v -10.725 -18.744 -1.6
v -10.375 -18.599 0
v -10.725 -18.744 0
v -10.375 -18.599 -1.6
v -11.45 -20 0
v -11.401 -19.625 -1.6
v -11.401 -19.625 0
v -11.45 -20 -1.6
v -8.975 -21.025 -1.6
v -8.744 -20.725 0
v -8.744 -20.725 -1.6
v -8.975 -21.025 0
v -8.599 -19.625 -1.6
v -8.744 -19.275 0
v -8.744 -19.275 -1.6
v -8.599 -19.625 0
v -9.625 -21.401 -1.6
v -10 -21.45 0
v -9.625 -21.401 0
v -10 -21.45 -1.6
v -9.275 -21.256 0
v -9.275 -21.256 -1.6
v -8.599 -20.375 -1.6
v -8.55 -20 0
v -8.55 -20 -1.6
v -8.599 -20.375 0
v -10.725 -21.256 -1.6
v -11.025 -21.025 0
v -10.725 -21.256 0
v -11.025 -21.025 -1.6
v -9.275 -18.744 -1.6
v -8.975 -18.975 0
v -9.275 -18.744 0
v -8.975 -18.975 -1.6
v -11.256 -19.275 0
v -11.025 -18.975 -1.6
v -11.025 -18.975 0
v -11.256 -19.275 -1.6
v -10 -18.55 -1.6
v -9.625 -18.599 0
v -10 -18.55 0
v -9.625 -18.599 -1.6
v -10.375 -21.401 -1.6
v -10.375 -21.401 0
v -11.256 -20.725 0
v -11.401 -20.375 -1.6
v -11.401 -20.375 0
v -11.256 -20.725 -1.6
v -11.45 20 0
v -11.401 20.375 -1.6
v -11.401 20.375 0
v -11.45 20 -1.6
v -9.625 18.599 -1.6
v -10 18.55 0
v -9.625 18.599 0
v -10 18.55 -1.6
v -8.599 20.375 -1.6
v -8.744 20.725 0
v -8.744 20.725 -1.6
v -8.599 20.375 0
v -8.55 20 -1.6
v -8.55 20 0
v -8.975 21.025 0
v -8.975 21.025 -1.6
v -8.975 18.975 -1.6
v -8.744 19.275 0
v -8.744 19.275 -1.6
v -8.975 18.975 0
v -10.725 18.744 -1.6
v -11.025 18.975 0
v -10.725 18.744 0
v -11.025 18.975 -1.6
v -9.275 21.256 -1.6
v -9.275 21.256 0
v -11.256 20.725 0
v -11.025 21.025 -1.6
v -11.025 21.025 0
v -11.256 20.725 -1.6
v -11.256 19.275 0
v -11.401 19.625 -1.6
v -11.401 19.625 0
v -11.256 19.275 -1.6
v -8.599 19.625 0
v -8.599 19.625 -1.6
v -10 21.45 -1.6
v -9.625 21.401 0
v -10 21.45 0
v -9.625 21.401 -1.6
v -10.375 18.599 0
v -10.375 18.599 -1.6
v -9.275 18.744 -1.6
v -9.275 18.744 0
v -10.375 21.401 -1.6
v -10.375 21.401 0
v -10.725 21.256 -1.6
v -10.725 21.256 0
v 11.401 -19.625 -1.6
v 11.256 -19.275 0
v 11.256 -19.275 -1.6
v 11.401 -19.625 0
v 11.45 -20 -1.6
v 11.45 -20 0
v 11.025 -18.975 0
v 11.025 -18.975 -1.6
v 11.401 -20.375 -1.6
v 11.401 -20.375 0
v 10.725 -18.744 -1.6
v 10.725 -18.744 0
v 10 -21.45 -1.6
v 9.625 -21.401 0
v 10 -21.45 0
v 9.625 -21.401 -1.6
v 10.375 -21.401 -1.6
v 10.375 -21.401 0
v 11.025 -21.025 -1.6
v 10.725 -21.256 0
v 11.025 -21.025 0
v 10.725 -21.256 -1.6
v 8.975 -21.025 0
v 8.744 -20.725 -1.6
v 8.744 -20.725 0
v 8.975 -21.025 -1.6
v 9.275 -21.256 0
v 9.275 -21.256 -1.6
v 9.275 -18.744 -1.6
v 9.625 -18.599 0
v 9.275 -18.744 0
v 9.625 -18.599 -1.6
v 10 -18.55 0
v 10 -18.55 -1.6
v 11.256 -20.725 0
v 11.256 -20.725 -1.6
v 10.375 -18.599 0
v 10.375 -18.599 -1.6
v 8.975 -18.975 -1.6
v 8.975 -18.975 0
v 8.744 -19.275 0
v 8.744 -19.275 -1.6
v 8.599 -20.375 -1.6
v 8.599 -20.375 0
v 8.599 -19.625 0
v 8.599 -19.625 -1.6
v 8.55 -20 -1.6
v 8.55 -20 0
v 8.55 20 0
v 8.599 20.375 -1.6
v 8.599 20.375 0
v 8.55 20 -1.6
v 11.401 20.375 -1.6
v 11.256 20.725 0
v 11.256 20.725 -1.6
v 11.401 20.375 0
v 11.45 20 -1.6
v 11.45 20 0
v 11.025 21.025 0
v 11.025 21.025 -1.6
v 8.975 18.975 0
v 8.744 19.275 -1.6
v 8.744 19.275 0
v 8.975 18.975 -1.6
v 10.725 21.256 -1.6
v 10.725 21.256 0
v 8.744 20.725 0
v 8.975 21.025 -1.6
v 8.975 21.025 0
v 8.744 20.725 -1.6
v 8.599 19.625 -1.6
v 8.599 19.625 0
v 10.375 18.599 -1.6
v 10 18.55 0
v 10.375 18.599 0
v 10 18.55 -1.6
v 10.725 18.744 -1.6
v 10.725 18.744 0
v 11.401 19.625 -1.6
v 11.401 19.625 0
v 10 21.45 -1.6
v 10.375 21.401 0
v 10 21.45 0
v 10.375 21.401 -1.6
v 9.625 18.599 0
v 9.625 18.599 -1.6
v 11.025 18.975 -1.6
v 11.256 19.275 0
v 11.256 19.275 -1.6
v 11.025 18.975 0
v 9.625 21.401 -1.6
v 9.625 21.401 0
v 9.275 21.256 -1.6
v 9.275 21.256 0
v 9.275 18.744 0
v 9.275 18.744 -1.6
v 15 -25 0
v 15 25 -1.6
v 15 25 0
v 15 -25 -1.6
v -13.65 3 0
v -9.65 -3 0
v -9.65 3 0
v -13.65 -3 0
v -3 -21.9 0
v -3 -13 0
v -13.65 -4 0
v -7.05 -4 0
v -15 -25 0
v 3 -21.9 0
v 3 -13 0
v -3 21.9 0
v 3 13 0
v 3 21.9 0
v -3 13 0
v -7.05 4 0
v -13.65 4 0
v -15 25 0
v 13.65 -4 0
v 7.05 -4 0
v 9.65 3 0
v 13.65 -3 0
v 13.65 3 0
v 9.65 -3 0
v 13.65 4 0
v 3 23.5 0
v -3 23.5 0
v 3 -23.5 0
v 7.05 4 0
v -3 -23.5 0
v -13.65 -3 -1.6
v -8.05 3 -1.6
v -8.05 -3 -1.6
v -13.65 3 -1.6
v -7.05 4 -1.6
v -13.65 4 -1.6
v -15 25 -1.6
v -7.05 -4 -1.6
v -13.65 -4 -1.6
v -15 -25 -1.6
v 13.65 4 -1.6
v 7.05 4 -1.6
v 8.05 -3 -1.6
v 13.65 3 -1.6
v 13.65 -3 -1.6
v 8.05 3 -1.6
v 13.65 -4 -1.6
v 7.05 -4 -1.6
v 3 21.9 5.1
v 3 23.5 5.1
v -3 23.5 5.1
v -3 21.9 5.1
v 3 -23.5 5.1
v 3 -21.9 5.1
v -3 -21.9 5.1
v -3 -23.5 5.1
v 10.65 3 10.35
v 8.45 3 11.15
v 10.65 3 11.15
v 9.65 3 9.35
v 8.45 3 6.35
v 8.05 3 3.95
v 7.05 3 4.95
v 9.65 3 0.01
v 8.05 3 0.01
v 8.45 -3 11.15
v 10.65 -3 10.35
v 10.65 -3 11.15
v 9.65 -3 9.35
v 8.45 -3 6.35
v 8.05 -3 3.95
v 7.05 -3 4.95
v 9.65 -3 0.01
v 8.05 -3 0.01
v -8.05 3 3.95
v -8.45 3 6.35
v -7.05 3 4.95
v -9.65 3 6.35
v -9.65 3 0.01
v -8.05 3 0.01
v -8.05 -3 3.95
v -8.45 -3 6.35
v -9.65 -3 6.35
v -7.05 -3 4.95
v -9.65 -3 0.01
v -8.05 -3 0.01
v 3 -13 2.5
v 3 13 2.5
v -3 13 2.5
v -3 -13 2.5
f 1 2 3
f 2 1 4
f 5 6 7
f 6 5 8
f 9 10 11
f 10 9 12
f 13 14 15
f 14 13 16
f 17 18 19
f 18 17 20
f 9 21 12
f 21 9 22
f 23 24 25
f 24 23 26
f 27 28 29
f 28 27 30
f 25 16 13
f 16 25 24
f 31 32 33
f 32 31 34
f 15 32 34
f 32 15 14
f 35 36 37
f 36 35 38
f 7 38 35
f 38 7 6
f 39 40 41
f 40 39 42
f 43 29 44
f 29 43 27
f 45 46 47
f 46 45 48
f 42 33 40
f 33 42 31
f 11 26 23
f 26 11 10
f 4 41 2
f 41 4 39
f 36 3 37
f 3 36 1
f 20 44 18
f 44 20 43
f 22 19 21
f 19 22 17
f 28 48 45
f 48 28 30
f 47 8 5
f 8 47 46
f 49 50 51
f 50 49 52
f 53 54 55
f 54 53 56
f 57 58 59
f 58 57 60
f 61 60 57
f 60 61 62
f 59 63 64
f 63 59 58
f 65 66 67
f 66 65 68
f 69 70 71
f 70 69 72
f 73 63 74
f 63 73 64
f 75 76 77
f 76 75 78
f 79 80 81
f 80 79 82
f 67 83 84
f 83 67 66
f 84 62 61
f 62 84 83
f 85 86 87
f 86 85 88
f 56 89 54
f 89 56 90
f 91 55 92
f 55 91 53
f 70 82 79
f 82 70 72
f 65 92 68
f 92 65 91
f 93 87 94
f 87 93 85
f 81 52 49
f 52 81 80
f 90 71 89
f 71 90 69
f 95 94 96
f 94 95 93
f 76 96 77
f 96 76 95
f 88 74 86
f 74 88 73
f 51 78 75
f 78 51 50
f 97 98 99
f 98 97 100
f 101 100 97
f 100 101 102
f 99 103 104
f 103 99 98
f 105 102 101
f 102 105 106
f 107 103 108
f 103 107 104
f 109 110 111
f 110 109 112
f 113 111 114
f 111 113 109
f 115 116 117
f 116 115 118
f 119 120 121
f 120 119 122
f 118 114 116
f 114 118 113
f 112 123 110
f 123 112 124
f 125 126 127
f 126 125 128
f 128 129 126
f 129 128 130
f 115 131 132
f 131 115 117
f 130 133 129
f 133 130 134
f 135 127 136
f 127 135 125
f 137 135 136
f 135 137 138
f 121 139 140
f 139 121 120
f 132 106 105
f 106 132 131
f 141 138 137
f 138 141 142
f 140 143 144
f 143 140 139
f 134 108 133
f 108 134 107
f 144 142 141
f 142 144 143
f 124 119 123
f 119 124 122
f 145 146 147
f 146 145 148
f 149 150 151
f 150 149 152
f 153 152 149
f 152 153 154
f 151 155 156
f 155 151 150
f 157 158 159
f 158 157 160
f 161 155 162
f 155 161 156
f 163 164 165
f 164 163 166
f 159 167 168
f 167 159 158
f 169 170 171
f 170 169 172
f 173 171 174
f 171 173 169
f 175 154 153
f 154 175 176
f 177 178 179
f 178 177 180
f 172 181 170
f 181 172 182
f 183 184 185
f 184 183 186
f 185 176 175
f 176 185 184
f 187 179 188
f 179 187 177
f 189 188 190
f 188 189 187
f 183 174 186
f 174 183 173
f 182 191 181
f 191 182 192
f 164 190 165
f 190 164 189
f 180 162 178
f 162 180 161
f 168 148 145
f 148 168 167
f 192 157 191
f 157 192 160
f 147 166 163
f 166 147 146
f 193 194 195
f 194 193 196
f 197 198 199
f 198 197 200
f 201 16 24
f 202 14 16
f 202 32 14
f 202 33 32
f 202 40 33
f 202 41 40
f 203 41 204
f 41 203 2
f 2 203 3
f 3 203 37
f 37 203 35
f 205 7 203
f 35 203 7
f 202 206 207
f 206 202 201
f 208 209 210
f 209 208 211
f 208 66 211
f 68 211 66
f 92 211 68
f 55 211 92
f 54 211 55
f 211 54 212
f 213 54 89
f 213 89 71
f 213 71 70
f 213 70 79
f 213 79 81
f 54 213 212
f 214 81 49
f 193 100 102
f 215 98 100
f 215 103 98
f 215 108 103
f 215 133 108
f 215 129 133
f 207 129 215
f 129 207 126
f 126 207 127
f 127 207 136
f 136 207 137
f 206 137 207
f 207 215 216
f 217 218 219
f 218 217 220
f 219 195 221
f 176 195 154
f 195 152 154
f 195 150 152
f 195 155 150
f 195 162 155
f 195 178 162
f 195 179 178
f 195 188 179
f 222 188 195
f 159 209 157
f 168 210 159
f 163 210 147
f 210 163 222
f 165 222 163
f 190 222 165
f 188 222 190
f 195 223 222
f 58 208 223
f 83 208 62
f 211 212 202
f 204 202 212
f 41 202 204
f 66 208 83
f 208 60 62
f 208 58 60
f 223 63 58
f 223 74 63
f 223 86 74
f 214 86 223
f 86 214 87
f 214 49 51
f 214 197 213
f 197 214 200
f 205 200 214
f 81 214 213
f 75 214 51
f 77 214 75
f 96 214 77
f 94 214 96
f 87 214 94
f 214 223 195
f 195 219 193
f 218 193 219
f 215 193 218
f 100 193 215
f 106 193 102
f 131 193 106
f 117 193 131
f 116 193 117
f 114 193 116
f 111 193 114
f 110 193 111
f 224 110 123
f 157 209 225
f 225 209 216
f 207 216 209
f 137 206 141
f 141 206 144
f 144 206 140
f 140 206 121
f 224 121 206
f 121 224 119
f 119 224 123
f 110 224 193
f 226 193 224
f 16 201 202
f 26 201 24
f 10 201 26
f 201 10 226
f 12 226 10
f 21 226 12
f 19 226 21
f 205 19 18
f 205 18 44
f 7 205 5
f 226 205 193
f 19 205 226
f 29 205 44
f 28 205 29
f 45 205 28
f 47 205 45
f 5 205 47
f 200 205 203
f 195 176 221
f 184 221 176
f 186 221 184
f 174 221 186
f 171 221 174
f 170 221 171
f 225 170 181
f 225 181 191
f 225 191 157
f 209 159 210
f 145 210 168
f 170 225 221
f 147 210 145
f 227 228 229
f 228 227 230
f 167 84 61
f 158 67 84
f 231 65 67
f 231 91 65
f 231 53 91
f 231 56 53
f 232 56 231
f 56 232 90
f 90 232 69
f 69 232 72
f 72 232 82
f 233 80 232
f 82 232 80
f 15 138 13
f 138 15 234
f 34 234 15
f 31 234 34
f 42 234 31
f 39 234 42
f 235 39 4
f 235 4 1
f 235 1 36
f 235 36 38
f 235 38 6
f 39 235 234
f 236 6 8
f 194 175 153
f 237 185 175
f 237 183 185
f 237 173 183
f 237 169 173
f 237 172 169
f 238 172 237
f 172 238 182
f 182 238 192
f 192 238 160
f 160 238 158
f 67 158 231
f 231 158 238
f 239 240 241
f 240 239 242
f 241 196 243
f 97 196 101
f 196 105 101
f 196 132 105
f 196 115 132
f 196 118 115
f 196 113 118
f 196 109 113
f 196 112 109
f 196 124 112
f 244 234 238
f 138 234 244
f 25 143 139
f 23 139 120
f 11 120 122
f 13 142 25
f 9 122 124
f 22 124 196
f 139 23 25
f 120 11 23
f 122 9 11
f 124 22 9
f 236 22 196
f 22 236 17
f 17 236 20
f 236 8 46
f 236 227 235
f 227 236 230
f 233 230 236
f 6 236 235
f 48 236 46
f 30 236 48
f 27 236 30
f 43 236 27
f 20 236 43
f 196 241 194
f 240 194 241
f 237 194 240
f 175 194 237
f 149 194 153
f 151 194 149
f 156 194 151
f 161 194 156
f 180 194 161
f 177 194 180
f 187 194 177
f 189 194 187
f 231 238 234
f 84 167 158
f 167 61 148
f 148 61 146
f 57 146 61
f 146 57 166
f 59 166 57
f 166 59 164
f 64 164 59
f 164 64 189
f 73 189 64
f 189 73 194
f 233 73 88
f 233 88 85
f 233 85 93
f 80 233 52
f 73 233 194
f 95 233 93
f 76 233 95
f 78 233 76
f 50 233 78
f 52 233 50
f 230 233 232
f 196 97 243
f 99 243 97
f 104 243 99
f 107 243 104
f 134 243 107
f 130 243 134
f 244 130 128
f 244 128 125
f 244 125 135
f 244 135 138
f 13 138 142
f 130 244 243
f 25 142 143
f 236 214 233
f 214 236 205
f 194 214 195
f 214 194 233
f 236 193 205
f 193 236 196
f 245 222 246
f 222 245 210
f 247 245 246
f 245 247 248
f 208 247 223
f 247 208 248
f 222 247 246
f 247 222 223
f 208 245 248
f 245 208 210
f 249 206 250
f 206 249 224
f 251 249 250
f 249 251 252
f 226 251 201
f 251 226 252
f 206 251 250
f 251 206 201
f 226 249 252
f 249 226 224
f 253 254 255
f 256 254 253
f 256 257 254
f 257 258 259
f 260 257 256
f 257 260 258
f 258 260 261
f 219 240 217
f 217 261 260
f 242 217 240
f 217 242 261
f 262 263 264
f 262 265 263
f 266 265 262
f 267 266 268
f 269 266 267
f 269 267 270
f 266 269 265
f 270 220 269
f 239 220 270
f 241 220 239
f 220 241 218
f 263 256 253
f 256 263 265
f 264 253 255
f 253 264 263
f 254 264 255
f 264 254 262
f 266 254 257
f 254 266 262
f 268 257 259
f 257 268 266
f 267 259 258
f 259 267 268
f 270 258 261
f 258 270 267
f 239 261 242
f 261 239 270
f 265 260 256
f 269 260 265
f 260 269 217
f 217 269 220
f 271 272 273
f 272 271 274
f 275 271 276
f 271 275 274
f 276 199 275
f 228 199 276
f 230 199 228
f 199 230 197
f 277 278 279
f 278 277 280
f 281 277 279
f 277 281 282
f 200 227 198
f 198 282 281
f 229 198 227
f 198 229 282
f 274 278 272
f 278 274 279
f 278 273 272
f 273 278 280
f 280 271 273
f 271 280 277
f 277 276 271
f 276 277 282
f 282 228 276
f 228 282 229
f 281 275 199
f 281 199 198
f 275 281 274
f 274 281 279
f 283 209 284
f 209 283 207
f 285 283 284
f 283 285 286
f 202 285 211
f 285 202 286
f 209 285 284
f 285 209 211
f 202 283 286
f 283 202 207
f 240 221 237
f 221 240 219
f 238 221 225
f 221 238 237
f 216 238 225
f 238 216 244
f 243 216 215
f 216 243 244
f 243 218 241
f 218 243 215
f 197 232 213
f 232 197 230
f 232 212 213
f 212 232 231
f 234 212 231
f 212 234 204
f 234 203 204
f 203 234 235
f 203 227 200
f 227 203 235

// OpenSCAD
// file: ../../screw-post/screw-post.scad
//-----------------------------------------------------------------------
// Screw post: a round post off the floor that a board screws down onto
//
// Two ways to fix:
//   "nut"  clearance hole through the post and floor; the nut sits in a hex
//          trap in the floor's underside, so the screw goes in from the top
//   "tap"  a pilot hole the screw cuts its own thread in (one or two fittings
//          in PLA/PETG); blind, the floor stays whole underneath
// and "head" for a screw up from below (head in a counterbore, nut on top).
//
// Modules, all in the same frame:
//   screwPostGhost()     the screw (and nut), for previews
//   screwPost()          the post: add to the floor
//   screwPostFloorCut()  subtract from the floor: nut trap / counterbore and hole
//
// Frame: origin on the floor top, on the post's axis. Z up; the floor is
// Z = -floorThick .. 0. Units: mm.
//
// Sizes: "M2", "M2.5", "M3". screwPostScrew(size, ...) says which screw length
// reaches, so a project can assert it has that screw in the kit.
//-----------------------------------------------------------------------

//-- [name, screw Ø, nut across flats, nut thick, head Ø, head height, tap hole, post Ø]
//-- Nuts ISO 4032; heads ISO 7380 button. Tap holes: the usual ~0.8 x Ø for plastic
screwSizes = [
  ["M2",   2.0, 4.0, 1.6, 3.5, 1.1, 1.6, 5.0],
  ["M2.5", 2.5, 5.0, 2.0, 4.4, 1.4, 2.1, 6.0],    // head 4.4: measured on the kit's M2.5 (controller base)
  ["M3",   3.0, 5.5, 2.4, 5.7, 1.65, 2.5, 7.0],
];

screwHoleClear = 0.4;     // added to the screw Ø for a clearance hole
screwNutClear  = 0.3;     // CAL: across flats, nut trap over the nut. Set by the fit piece
screwTapClear  = 0.0;     // CAL: added to the tap hole. Set by the fit piece
screwHeadClear = 0.6;     // counterbore over the head Ø

function screwSize(size) = let (i = search([size], screwSizes)[0])
  assert(i != [] && i != undef, str("unknown screw size ", size)) screwSizes[i];
function screwDia(size)    = screwSize(size)[1];
function screwNutAF(size)  = screwSize(size)[2];
function screwNutH(size)   = screwSize(size)[3];
function screwHeadDia(size)= screwSize(size)[4];
function screwHeadH(size)  = screwSize(size)[5];
function screwPostDia(size)= screwSize(size)[7];

//-- Shortest screw that fills the nut, from the top of the clamped part (h + clamp
//-- above the floor) down to the nut trap's underside. Round up to a length you have.
function screwPostScrew(size, h, floorThick, clamp = 1.6) = h + clamp + floorThick;

module screwPostGhost(size, h, floorThick, clamp = 1.6, length, how = "nut")
{
  d = screwDia(size);
  L = is_undef(length) ? screwPostScrew(size, h, floorThick, clamp) : length;
  top = h + clamp;
  if (how == "head")
  {
    %color("Silver") translate([0, 0, -floorThick]) cylinder(d = screwHeadDia(size), h = screwHeadH(size), $fn = 24);
    %color("Silver") translate([0, 0, -floorThick + screwHeadH(size)]) cylinder(d = d, h = L, $fn = 16);
  }
  else
  {
    %color("Silver") translate([0, 0, top]) cylinder(d = screwHeadDia(size), h = screwHeadH(size), $fn = 24);
    %color("Silver") translate([0, 0, top - L]) cylinder(d = d, h = L, $fn = 16);
    if (how == "nut")
      %color("DimGray") translate([0, 0, -floorThick]) rotate([0, 0, 30]) cylinder(d = screwNutAF(size)/cos(30), h = screwNutH(size), $fn = 6);
  }
}

//-- how: "nut" | "head" (through hole) or "tap" (blind pilot hole). postDia defaults by size
module screwPost(size, h, how = "nut", postDia, tapClear = screwTapClear)
{
  pd = is_undef(postDia) ? screwPostDia(size) : postDia;
  hole = how == "tap" ? screwSize(size)[6] + tapClear : screwDia(size) + screwHoleClear;
  difference()
  {
    translate([0, 0, -0.01]) cylinder(d = pd, h = h + 0.01, $fn = 40);
    translate([0, 0, how == "tap" ? 0.6 : -1]) cylinder(d = hole, h = h + 2, $fn = 24);
    //-- lead-in so the screw starts square
    translate([0, 0, h - 0.4]) cylinder(d1 = hole, d2 = hole + 0.8, h = 0.41, $fn = 24);
  }
}

//-- "nut": hex trap from the underside, opening a little over the nut so it sits flush.
//-- "head": counterbore for the head. "tap": nothing.
module screwPostFloorCut(size, floorThick, how = "nut", nutClear = screwNutClear)
{
  d = screwDia(size) + screwHoleClear;
  if (how == "nut")
  {
    af = screwNutAF(size) + nutClear;
    translate([0, 0, -floorThick - 1]) rotate([0, 0, 30]) cylinder(d = af/cos(30), h = screwNutH(size) + 0.1 + 1, $fn = 6);
    translate([0, 0, -floorThick - 1]) cylinder(d = d + 0.4, h = floorThick + 2, $fn = 24);
  }
  if (how == "head")
  {
    translate([0, 0, -floorThick - 1]) cylinder(d = screwHeadDia(size) + screwHeadClear, h = screwHeadH(size) + 0.2 + 1, $fn = 32);
    translate([0, 0, -floorThick - 1]) cylinder(d = d + 0.4, h = floorThick + 2, $fn = 24);
  }
  assert(how == "tap" || floorThick >= (how == "nut" ? screwNutH(size) : screwHeadH(size)) + 0.1 + 0.3,
         str("floor too thin for the ", size, " ", how));
}
// file: ../../board-pocket/board-pocket.scad
//-----------------------------------------------------------------------
// Board pocket: holds a board that has no mounting holes
//
// The board sits on a central pedestal with a pad of double-sided foam tape
// on top, inside a low wall that follows its outline. The pedestal keeps
// the board's edges off the floor, so lead stubs soldered through the edge
// holes have room underneath; gaps in the wall let the leads out. The wall
// only locates the board: the tape holds it down, and in a closed box a lid
// pad presses a pad of foam onto it (boardLidPad below).
//
// Modules, all in the same frame:
//   boardPocketGhost()   the board and its tape, for previews
//   boardPocketHolder()  the plastic: pedestal and outline wall, add to the floor
//   boardLidPad()        a block hanging from the lid that presses foam onto the board
//   boardLidPadGhost()   the foam under it, squashed, for previews
//
// Frame: origin on the floor top, under the centre of the board's outline.
// X along the board's length l, Y across its width w, Z up. Units: mm.
//
// Sides are listed [-X, +X, -Y, +Y], each one of
//   "gap"    wall with a gap in the middle for leads (gapW wide)
//   "solid"  whole wall: use it where the board takes a push (a plug)
//   "open"   no wall: the board's edge goes into a box wall (a USB port)
//
// Used by esp32-c3-supermini, esp32-s3-devkitc and rs485-max485.
//-----------------------------------------------------------------------

//-- From the controller project's receiver.scad / rack-end.scad (boardPocket), 2026-10-30
bpPedestal  = 2.5;     // floor to the tape: room for lead stubs under the board edges
bpTape      = 1.0;     // double-sided foam tape on the pedestal. CAL: how far it squashes
bpWall      = 1.2;     // outline wall thickness
bpRise      = 1.0;     // wall top above the PCB underside (the controller project's rack-end: 0.8 under the S3's module)
bpClearance = 0.4;     // per side, board outline to wall: PETG. 0.3 for PLA. Set by the fit piece
bpGapW      = 6;       // lead gap in a "gap" side
bpPadInset  = 4;       // default pedestal: the board less this all round

//-- Lid hold-down (the controller project's receiver / rack-end lid pads)
bpFoam      = 3.0;     // CAL: self-adhesive foam stuck under each lid pad
bpSqueeze   = 1.0;     // how far the lid squashes it: ~1/3 for soft foam, 0.3 for felt

//-- PCB underside above the floor top
function boardPocketZ(pedestal = bpPedestal, tape = bpTape) = pedestal + tape;
//-- default pedestal [l, w] for a board
function boardPocketPad(l, w, inset = bpPadInset) = [max(l - 2*inset, 4), max(w - 2*inset, 4)];
//-- Z of a lid pad's underside, pressing on a surface at surfaceZ (board top, or a part on it)
function boardLidPadZ(surfaceZ, foam = bpFoam, squeeze = bpSqueeze) =
  assert(squeeze > 0 && squeeze < foam, "foam would not touch the board")
  surfaceZ + foam - squeeze;

function bpSides4(s) = is_list(s) ? s : [s, s, s, s];

module boardPocketGhost(l, w, pcb = 1.6, pad, pedestal = bpPedestal, tape = bpTape)
{
  p = is_undef(pad) ? boardPocketPad(l, w) : pad;
  %color("White") translate([-p[0]/2, -p[1]/2, pedestal]) cube([p[0], p[1], tape]);
  %color("DarkGreen") translate([-l/2, -w/2, pedestal + tape]) cube([l, w, pcb]);
}

//-- pad: pedestal [l, w]; gapW a number or one per side
module boardPocketHolder(l, w, pad, sides = "gap", gapW = bpGapW, clearance = bpClearance,
                         pedestal = bpPedestal, tape = bpTape, wall = bpWall, rise = bpRise)
{
  p   = is_undef(pad) ? boardPocketPad(l, w) : pad;
  s   = bpSides4(sides);
  g   = bpSides4(gapW);
  ix  = l/2 + clearance;                 // inner half sizes
  iy  = w/2 + clearance;
  top = pedestal + tape + rise;
  assert(p[0] <= l && p[1] <= w, "pedestal bigger than the board");
  for (k = s) assert(k == "gap" || k == "solid" || k == "open", str("unknown side ", k));

  //-- pedestal, centred under the board
  translate([-p[0]/2, -p[1]/2, -0.01]) cube([p[0], p[1], pedestal + 0.01]);
  //-- outline wall
  difference()
  {
    translate([-ix - wall, -iy - wall, -0.01]) cube([2*(ix + wall), 2*(iy + wall), top + 0.01]);
    translate([-ix, -iy, -1]) cube([2*ix, 2*iy, top + 2]);
    for (i = [0 : 3])
    {
      //-- each side's cut, drawn for -X then turned into place
      ax = (i < 2) ? ix : iy;         // inner half size across the side
      al = (i < 2) ? iy : ix;         // half length along it
      rotate([0, 0, [0, 180, 90, 270][i]])   // -X, +X, -Y, +Y
      {
        if (s[i] == "gap")
          translate([-ax - wall - 1, -g[i]/2, -1]) cube([wall + 2, g[i], top + 2]);
        if (s[i] == "open")
          translate([-ax - wall - 1, -al - wall - 1, -1]) cube([wall + 1.01, 2*(al + wall + 1), top + 2]);
      }
    }
  }
}

//-- A lid pad over the rectangle size [x, y] centred at `at`, from the squashed foam up to
//-- lidZ (the lid's inner face in this frame), running `into` up into the lid plate
module boardLidPad(size, at = [0, 0], surfaceZ, lidZ, foam = bpFoam, squeeze = bpSqueeze, into = 0.5)
{
  z0 = boardLidPadZ(surfaceZ, foam, squeeze);
  assert(lidZ > z0, "lid is below the pad: the box is too low for the foam");
  translate([at[0] - size[0]/2, at[1] - size[1]/2, z0]) cube([size[0], size[1], lidZ - z0 + into]);
}

module boardLidPadGhost(size, at = [0, 0], surfaceZ, foam = bpFoam, squeeze = bpSqueeze)
{
  %color("Gray") translate([at[0] - size[0]/2, at[1] - size[1]/2, surfaceZ]) cube([size[0], size[1], foam - squeeze]);
}
// file: ../../rs485-max485/rs485-max485.scad
//-----------------------------------------------------------------------
// TTL-to-RS485 module (MAX485 and friends), on the floor
//
// These modules have no mounting holes. The board sits on a taped pedestal
// inside an outline pocket (board-pocket), with lead gaps at both ends (bus
// end and logic end) and in the long sides. In a closed box two lid pads
// press foam onto it, one inboard of each end's pin row.
//
// Modules, all in the same frame:
//   rs485Ghost()     the board, its chips, pin holes and any screw terminal
//   rs485Holder()    the plastic: pedestal and outline pocket, add to the floor
//   rs485LidPads()   blocks under the lid that press foam onto the board
//
// Frame: origin on the floor top under the centre of the board. X along the
// board, bus end (A/B) at -X, logic end (VCC/TXD/RXD/GND) at +X. Z up. Units: mm.
//
// Sizes: pick a row of rs485Variants by name.
//-----------------------------------------------------------------------

//-- included, not used, so its default values (bpTape, bpClearance...) are in scope here
include <../board-pocket/board-pocket.scad>

//-- [name, length, width, pcb, tallest SMD, bus pins, logic pins, screw terminal [l, w, h] or undef]
rs485Variants = [
  //-- JZK 5-pack B09VGJCJKQ, auto-direction (MAX485 + CD4069). Outline measured 2026-10-21;
  //-- PCB CAL (probably 1.6). Bus end: A+ B- earth, bare holes. Logic: VCC TXD RXD GND
  ["jzk",    43.0, 15.5,  1.6, 2.0, 3, 4, undef],
  //-- XY-017 auto-direction (WINGONEER manual, manuals.plus/asin/B06XHH6B6R): 42.8 x 15.22 x 0.8.
  //-- Looks like the same family as the JZK; pin counts CAL
  ["xy-017", 42.8, 15.22, 0.8, 2.0, 3, 4, undef],
  //-- Classic blue MAX485 module (HW-0519 style): 44 x 14 on most listings (some 45 x 15, 46 x 12),
  //-- 4-pin header each end (RO RE DE DI / VCC B A GND), 2-way 5.08 screw terminal at the bus end.
  //-- PCB, terminal size and its place on the board CAL
  ["max485", 44.0, 14.0,  1.6, 2.0, 4, 4, [7.5, 10.2, 10.0]],
];
rs485Variant  = "jzk";

rs485PinPitch = 2.54;
rs485PinEnd   = 1.5;      // CAL: pin row centre from the board's end
rs485ChipSize = [5.0, 6.0, 1.75];   // SOIC-8, ghost only; placed either side of the middle (CAL)
//-- Holder (the controller project's receiver.scad / rack-end.scad)
rs485PadEnd   = 8.5;      // pedestal stops this far from each end: clear of the pin stubs
rs485PadSide  = 3.25;     // and this far from each long side (26 x 9 on the JZK)
rs485EndGap   = 10;       // lead gap at the ends: the 4-pin row is 7.62 across, plus wire
rs485SideGap  = 6;
rs485PadInset = 6;        // lid pads: this far inboard of each end
rs485PadLen   = 6;

function rs485(name = rs485Variant) = let (i = search([name], rs485Variants)[0])
  assert(i != [] && i != undef, str("unknown RS485 variant ", name)) rs485Variants[i];
function rs485Pad(variant = rs485Variant) = let (v = rs485(variant))
  [v[1] - 2*rs485PadEnd, v[2] - 2*rs485PadSide];
//-- PCB top above the floor
function rs485Top(variant = rs485Variant, pedestal = bpPedestal, tape = bpTape) =
  boardPocketZ(pedestal, tape) + rs485(variant)[3];

module rs485Ghost(variant = rs485Variant, pedestal = bpPedestal, tape = bpTape)
{
  v   = rs485(variant);
  top = rs485Top(variant, pedestal, tape);
  boardPocketGhost(v[1], v[2], v[3], rs485Pad(variant), pedestal, tape);
  for (x = [-1, 1])
    %color("Black") translate([x*5 - rs485ChipSize[0]/2, -rs485ChipSize[1]/2, top]) cube(rs485ChipSize);
  //-- pin rows across each end
  for (e = [[-1, v[5]], [1, v[6]]], i = [0 : e[1] - 1])
    %color("Gold") translate([e[0]*(v[1]/2 - rs485PinEnd), (i - (e[1] - 1)/2)*rs485PinPitch, top - v[3] - 0.01])
      cylinder(d = 1.0, h = v[3] + 0.02, $fn = 12);
  if (!is_undef(v[7]))
    %color("RoyalBlue") translate([-v[1]/2 + 3, -v[7][1]/2, top]) cube(v[7]);
}

module rs485Holder(variant = rs485Variant, sides = "gap", clearance = bpClearance,
                   pedestal = bpPedestal, tape = bpTape, rise = bpRise)
{
  v = rs485(variant);
  boardPocketHolder(v[1], v[2], rs485Pad(variant), sides,
                    [rs485EndGap, rs485EndGap, rs485SideGap, rs485SideGap],
                    clearance, pedestal, tape, bpWall, rise);
}

//-- lidZ: the lid's inner face above the floor top. With a screw terminal, the bus-end pad
//-- moves inboard of it
module rs485LidPads(lidZ, variant = rs485Variant, foam = bpFoam, squeeze = bpSqueeze,
                    pedestal = bpPedestal, tape = bpTape)
{
  v   = rs485(variant);
  top = rs485Top(variant, pedestal, tape);
  busIn = is_undef(v[7]) ? rs485PadInset : 3 + v[7][0] + 1;
  for (x = [-v[1]/2 + busIn + rs485PadLen/2, v[1]/2 - rs485PadInset - rs485PadLen/2])
    boardLidPad([rs485PadLen, v[2] - 3], [x, 0], top, lidZ, foam, squeeze);
}
// main file
// A JZK RS485 module's hooks on a 3 x 5 carrier plate, for the catalogue: pedestal strip,
// end stops, a hook on each long edge (the +X one with a release tab). The plate is the
// carrier part's, solid (open = false) because the hooks' tongues need the area.
use <../snap-hook.scad>
use <../../rs485-max485/rs485-max485.scad>
use <../../carrier/carrier.scad>

variant  = "jzk";
pedestal = 2.5;
padW     = 6;
padEnd   = 8.5;
stopClear = 0.4;
stopW    = 6;
stopT    = 1.6;
stopRise = 1.0;
plate    = 1.6;
nx = 3; ny = 5;                     // carrier units of 10

v   = rs485(variant);
L   = v[1]; W = v[2];
top = pedestal + v[3];

difference()
{
  union()
  {
    carrierPlate(nx, ny, open = false);
    translate([-padW/2, -(L/2 - padEnd), -0.01]) cube([padW, L - 2*padEnd, pedestal + 0.01]);
    for (m = [0, 1]) mirror([0, m, 0])
      translate([-stopW/2, L/2 + stopClear, -0.01]) cube([stopW, stopT, top + stopRise + 0.01]);
    snapHookPair(W, top, tab = [false, true]);
  }
  snapHookPairFloorCut(W, top, floorThick = plate);
}
